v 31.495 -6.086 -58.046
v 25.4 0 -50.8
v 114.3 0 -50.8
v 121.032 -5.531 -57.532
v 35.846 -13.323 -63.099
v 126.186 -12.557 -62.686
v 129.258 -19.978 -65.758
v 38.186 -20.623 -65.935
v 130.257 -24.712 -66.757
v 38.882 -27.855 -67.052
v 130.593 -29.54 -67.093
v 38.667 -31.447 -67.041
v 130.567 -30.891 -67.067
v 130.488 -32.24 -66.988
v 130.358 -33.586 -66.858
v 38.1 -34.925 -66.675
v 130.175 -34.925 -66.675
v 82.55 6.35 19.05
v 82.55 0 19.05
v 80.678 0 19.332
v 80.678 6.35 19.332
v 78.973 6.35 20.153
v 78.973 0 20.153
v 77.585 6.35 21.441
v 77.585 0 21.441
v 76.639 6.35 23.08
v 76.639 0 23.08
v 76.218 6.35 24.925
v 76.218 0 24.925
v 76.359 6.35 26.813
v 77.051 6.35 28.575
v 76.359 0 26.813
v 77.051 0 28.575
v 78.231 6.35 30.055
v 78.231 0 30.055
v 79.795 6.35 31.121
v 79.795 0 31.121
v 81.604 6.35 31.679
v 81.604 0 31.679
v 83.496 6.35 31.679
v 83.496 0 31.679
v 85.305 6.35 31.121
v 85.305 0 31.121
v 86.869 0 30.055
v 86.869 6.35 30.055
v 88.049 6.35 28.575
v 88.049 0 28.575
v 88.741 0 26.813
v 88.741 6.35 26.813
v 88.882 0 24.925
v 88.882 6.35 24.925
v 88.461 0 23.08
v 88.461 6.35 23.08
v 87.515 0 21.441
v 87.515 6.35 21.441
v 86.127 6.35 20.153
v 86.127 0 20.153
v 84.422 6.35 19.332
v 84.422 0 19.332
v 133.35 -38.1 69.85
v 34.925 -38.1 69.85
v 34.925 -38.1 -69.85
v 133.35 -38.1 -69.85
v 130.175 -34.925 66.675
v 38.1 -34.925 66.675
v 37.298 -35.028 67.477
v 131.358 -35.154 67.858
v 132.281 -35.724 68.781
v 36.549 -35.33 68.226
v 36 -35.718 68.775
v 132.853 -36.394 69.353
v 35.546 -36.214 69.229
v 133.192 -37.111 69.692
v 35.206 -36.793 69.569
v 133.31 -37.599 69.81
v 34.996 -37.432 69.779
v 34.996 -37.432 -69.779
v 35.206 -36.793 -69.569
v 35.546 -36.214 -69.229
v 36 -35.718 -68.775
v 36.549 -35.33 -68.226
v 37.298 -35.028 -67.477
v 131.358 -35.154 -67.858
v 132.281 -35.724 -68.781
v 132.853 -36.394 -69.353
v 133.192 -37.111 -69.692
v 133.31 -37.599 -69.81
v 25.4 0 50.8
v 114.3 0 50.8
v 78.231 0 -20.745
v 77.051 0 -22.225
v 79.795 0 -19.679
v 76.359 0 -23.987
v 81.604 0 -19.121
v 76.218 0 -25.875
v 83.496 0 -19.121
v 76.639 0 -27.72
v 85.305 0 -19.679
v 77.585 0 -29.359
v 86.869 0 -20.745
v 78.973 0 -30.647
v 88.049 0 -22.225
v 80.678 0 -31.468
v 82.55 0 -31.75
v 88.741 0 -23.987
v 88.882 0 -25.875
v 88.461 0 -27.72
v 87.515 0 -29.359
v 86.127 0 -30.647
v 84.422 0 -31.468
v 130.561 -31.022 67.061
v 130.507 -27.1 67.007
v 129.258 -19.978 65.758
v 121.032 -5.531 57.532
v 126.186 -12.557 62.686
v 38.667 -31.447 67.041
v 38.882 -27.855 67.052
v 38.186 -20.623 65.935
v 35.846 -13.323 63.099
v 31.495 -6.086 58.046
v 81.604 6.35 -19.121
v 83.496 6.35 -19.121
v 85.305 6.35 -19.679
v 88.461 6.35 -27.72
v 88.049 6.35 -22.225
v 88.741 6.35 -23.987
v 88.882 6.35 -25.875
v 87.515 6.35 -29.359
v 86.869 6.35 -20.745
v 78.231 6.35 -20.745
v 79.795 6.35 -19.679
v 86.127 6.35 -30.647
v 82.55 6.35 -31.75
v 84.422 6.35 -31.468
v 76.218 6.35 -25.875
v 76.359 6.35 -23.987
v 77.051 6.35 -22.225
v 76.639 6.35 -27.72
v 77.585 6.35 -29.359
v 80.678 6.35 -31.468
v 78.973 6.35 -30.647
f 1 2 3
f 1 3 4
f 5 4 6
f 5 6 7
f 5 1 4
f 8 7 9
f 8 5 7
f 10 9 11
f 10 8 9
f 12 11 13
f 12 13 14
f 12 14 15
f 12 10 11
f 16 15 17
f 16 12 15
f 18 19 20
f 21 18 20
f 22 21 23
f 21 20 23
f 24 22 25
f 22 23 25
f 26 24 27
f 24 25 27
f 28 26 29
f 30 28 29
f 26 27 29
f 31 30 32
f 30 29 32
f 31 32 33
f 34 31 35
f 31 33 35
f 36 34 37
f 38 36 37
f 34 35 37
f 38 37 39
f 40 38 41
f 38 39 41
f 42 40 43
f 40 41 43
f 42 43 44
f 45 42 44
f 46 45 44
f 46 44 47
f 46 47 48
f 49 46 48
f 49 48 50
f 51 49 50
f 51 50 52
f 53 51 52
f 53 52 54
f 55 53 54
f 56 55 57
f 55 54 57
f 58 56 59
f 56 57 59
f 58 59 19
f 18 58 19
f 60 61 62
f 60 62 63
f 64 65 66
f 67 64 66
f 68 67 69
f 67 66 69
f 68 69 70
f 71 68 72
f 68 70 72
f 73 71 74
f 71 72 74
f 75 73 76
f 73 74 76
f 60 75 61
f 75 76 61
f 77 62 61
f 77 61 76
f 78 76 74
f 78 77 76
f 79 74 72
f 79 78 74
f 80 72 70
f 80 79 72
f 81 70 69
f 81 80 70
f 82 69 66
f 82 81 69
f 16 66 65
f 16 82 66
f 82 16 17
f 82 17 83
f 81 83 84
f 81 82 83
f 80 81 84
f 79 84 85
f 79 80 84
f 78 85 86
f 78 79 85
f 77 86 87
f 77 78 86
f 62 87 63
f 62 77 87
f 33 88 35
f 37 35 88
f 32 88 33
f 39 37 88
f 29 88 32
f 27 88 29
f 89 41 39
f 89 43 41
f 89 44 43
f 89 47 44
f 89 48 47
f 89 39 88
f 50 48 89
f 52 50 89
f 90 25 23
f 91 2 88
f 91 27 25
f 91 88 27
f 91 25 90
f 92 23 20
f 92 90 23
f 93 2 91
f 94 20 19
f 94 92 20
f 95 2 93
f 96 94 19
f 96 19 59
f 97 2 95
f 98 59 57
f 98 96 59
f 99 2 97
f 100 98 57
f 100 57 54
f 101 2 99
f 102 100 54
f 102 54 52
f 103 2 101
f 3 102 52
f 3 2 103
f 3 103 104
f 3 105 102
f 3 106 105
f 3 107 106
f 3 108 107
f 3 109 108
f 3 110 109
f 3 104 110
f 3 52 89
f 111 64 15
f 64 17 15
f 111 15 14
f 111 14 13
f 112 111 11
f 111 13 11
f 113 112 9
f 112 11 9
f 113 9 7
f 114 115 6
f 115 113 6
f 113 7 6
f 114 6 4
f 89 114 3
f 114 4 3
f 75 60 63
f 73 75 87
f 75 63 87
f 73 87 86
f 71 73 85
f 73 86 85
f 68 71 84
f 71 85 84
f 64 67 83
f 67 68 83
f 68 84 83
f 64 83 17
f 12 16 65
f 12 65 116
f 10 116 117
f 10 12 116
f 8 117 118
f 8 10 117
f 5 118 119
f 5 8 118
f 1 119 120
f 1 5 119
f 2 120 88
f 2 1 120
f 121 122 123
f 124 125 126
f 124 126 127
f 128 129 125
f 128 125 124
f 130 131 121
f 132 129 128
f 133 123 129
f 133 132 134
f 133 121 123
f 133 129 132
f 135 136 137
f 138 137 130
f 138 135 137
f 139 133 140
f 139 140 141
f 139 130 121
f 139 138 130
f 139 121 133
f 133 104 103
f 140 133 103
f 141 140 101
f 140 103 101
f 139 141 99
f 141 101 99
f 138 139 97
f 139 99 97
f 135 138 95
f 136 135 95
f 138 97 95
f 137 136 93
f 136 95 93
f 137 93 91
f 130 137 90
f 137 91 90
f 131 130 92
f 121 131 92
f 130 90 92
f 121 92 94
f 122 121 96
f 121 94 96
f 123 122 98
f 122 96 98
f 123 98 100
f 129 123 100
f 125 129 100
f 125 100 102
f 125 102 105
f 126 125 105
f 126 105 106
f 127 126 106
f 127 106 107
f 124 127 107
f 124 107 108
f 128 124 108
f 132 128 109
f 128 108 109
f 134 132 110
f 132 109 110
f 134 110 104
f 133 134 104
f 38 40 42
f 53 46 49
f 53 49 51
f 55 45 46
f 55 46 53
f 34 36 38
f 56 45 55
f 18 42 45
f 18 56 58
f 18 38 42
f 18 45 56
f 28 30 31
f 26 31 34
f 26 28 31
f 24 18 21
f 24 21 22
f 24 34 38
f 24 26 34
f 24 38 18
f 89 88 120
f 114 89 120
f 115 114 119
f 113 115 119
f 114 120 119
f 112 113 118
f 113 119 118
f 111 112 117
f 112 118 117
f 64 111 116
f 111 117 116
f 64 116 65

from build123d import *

# Parameters (mm, degrees)
SKETCH1_W               = 228.6
SKETCH1_H               = 101.6
BOSS_EXTRUDE1_DEPTH     = 38.1
SKETCH2_W               = 266.7
SKETCH2_H               = 139.7
BOSS_EXTRUDE2_DEPTH     = 38.1
CUT_EXTRUDE1_DEPTH      = 70.85
CUT_EXTRUDE1_DEPTH_BACK = 70.85
CUT_EXTRUDE2_DEPTH      = 134.35
CUT_EXTRUDE2_DEPTH_BACK = 134.35
BOSS_EXTRUDE3_DEPTH     = 117.475
CUT_EXTRUDE3_DEPTH      = 70.85
CUT_EXTRUDE3_DEPTH_BACK = 70.85
BOSS_EXTRUDE6_DEPTH     = 50.8
CUT_EXTRUDE4_DEPTH      = 134.35
CUT_EXTRUDE4_DEPTH_BACK = 134.35
BOSS_EXTRUDE7_DEPTH     = 11.43
SKETCH12_W              = 101.6
SKETCH12_H              = 44.45
CUT_EXTRUDE5_DEPTH      = 57.15
SKETCH13_W              = 25.4
SKETCH13_H              = 15.875
CUT_EXTRUDE6_DEPTH      = 8.89
SKETCH14_W              = 234.95
SKETCH14_H              = 73.385904338
CUT_EXTRUDE7_DEPTH      = 70.85
CUT_EXTRUDE7_DEPTH_BACK = 70.85
SKETCH15_R              = 6.35
BOSS_EXTRUDE8_DEPTH     = 6.35
SKETCH16_W              = 114.519931472
SKETCH16_H              = 54.078527613
CUT_EXTRUDE8_DEPTH      = 70.85
CUT_EXTRUDE8_DEPTH_BACK = 70.85


with BuildPart() as part:
    # Sketch1 → Boss-Extrude1 (new body)
    with BuildSketch(Plane(origin=(0, 0, 0), x_dir=(1, 0, 0), z_dir=(0, 1, 0))):
        Rectangle(SKETCH1_W, SKETCH1_H)
    extrude(amount=BOSS_EXTRUDE1_DEPTH)

    # Sketch2 → Boss-Extrude2 (add)
    with BuildSketch(Plane.XZ):
        Rectangle(SKETCH2_W, SKETCH2_H)
    extrude(amount=BOSS_EXTRUDE2_DEPTH)

    # Sketch4 → Cut-Extrude1 (cut, two sides)
    with BuildSketch(Plane.XY) as cut_extrude1_sk:
        with BuildLine():
            Line((25.4, 0), (-25.4, 0))
            ThreePointArc((-25.4, 0), (-36.780856653, -15.633097581), (-38.1, -34.925))
            ThreePointArc((-38.1, -34.925), (-35.85493597, -35.85493597), (-34.925, -38.1))
            Line((-34.925, -38.1), (34.925, -38.1))
            ThreePointArc((34.925, -38.1), (35.85493597, -35.85493597), (38.1, -34.925))
            ThreePointArc((38.1, -34.925), (36.780856653, -15.633097581), (25.4, 0))
        make_face()
        with BuildLine():
            Line((114.3, 0), (138.625991559, 8.381745969))
            Line((138.625991559, 8.381745969), (149.850712343, -24.19529276))
            Line((149.850712343, -24.19529276), (133.35, -38.1))
            ThreePointArc((133.35, -38.1), (132.42006403, -35.85493597), (130.175, -34.925))
            ThreePointArc((130.175, -34.925), (127.462245798, -15.087615547), (114.3, 0))
        make_face()
        with BuildLine():
            Line((-149.850712343, -24.19529276), (-133.35, -38.1))
            ThreePointArc((-133.35, -38.1), (-132.42006403, -35.85493597), (-130.175, -34.925))
            ThreePointArc((-130.175, -34.925), (-127.462245798, -15.087615547), (-114.3, 0))
            Line((-114.3, 0), (-138.625991559, 8.381745969))
            Line((-138.625991559, 8.381745969), (-149.850712343, -24.19529276))
        make_face()
    extrude(amount=CUT_EXTRUDE1_DEPTH, mode=Mode.SUBTRACT)
    extrude(cut_extrude1_sk.sketch, amount=-CUT_EXTRUDE1_DEPTH_BACK, mode=Mode.SUBTRACT)

    # Sketch5 → Cut-Extrude2 (cut, two sides)
    with BuildSketch(Plane(origin=(0, 0, 0), x_dir=(0, 0, -1), z_dir=(1, 0, 0))) as cut_extrude2_sk:
        with BuildLine():
            Line((-69.85, -38.1), (-80.267672211, -6.179959038))
            Line((-80.267672211, -6.179959038), (-69.85, 0.848763613))
            Line((-69.85, 0.848763613), (-50.8, 0))
            ThreePointArc((-50.8, 0), (-63.962245798, -15.087615547), (-66.675, -34.925))
            ThreePointArc((-66.675, -34.925), (-68.92006403, -35.85493597), (-69.85, -38.1))
        make_face()
        with BuildLine():
            Line((69.85, 0.848763613), (50.8, 0))
            ThreePointArc((50.8, 0), (63.962245798, -15.087615547), (66.675, -34.925))
            ThreePointArc((66.675, -34.925), (68.92006403, -35.85493597), (69.85, -38.1))
            Line((69.85, -38.1), (80.267672211, -6.179959038))
            Line((80.267672211, -6.179959038), (69.85, 0.848763613))
        make_face()
    extrude(amount=CUT_EXTRUDE2_DEPTH, mode=Mode.SUBTRACT)
    extrude(cut_extrude2_sk.sketch, amount=-CUT_EXTRUDE2_DEPTH_BACK, mode=Mode.SUBTRACT)

    # Sketch7 → Boss-Extrude3 (add, symmetric)
    with BuildSketch(Plane(origin=(0, 0, 0), x_dir=(0, 0, -1), z_dir=(1, 0, 0))):
        with BuildLine():
            Line((-50.8, 38.1), (50.8, 38.1))
            ThreePointArc((50.8, 38.1), (53.975, 34.925), (50.8, 31.75))
            ThreePointArc((50.8, 31.75), (52.363441445, 19.05), (50.8, 6.35))
            ThreePointArc((50.8, 6.35), (53.975, 3.175), (50.8, 0))
            Line((50.8, 0), (-50.8, 0))
            ThreePointArc((-50.8, 0), (-53.975, 3.175), (-50.8, 6.35))
            ThreePointArc((-50.8, 6.35), (-52.363441445, 19.05), (-50.8, 31.75))
            ThreePointArc((-50.8, 31.75), (-53.975, 34.925), (-50.8, 38.1))
        make_face()
    extrude(amount=BOSS_EXTRUDE3_DEPTH, both=True)

    # Sketch8 → Cut-Extrude3 (cut, two sides)
    with BuildSketch(Plane.XY) as cut_extrude3_sk:
        with BuildLine():
            Line((-114.3, 38.1), (-123.468271352, 41.287608438))
            Line((-123.468271352, 41.287608438), (-120.491237125, -2.317187004))
            Line((-120.491237125, -2.317187004), (-114.3, 0))
            ThreePointArc((-114.3, 0), (-117.475, 3.175), (-114.3, 6.35))
            ThreePointArc((-114.3, 6.35), (-116.592108499, 19.05), (-114.3, 31.75))
            ThreePointArc((-114.3, 31.75), (-117.475, 34.925), (-114.3, 38.1))
        make_face()
        with BuildLine():
            Line((120.491237125, -2.317187004), (114.3, 0))
            ThreePointArc((114.3, 0), (117.475, 3.175), (114.3, 6.35))
            ThreePointArc((114.3, 6.35), (116.592108499, 19.05), (114.3, 31.75))
            ThreePointArc((114.3, 31.75), (117.475, 34.925), (114.3, 38.1))
            Line((114.3, 38.1), (123.468271352, 41.287608438))
            Line((123.468271352, 41.287608438), (120.491237125, -2.317187004))
        make_face()
    extrude(amount=CUT_EXTRUDE3_DEPTH, mode=Mode.SUBTRACT)
    extrude(cut_extrude3_sk.sketch, amount=-CUT_EXTRUDE3_DEPTH_BACK, mode=Mode.SUBTRACT)

    # Sketch9 → Boss-Extrude6 (add, symmetric)
    with BuildSketch(Plane.XY):
        with BuildLine():
            Line((-114.3, 38.1), (114.3, 38.1))
            ThreePointArc((114.3, 38.1), (92.707665567, 45.121477655), (79.375, 63.5))
            ThreePointArc((79.375, 63.5), (0, 41.272917837), (-79.375, 63.5))
            ThreePointArc((-79.375, 63.5), (-92.707665567, 45.121477655), (-114.3, 38.1))
        make_face()
    extrude(amount=BOSS_EXTRUDE6_DEPTH, both=True)

    # Sketch10 → Cut-Extrude4 (cut, two sides)
    with BuildSketch(Plane(origin=(0, 0, 0), x_dir=(0, 0, -1), z_dir=(1, 0, 0))) as cut_extrude4_sk:
        with BuildLine():
            Line((25.4, 63.5), (50.8, 63.5))
            Line((50.8, 63.5), (50.8, 38.1))
            ThreePointArc((50.8, 38.1), (35.780017166, 48.480017166), (25.4, 63.5))
        make_face()
        with BuildLine():
            Line((-50.8, 63.5), (-50.8, 38.1))
            ThreePointArc((-50.8, 38.1), (-35.780017166, 48.480017166), (-25.4, 63.5))
            Line((-25.4, 63.5), (-50.8, 63.5))
        make_face()
    extrude(amount=CUT_EXTRUDE4_DEPTH, mode=Mode.SUBTRACT)
    extrude(cut_extrude4_sk.sketch, amount=-CUT_EXTRUDE4_DEPTH_BACK, mode=Mode.SUBTRACT)

    # Sketch11 → Boss-Extrude7 (add)
    with BuildSketch(Plane.XY.offset(9.525)):
        with BuildLine():
            Line((-79.375, 63.5), (-79.375, 68.58))
            ThreePointArc((-79.375, 68.58), (0, 45.590721784), (79.375, 68.58))
            Line((79.375, 68.58), (79.375, 63.5))
            ThreePointArc((79.375, 63.5), (0, 23.789706403), (-79.375, 63.5))
        make_face()
    extrude(amount=BOSS_EXTRUDE7_DEPTH)

    # Sketch12 → Cut-Extrude5 (cut)
    with BuildSketch(Plane(origin=(0, 63.5, 0), x_dir=(-1, 0, 0), z_dir=(0, -1, 0))):
        Rectangle(SKETCH12_W, SKETCH12_H)
    extrude(amount=CUT_EXTRUDE5_DEPTH, mode=Mode.SUBTRACT)

    # Sketch13 → Cut-Extrude6 (cut)
    with BuildSketch(Plane.XY.offset(-22.225)):
        with Locations((-6.35, 26.9875)):
            Rectangle(SKETCH13_W, SKETCH13_H)
    extrude(amount=-CUT_EXTRUDE6_DEPTH, mode=Mode.SUBTRACT)

    # Sketch14 → Cut-Extrude7 (cut, two sides)
    with BuildSketch(Plane.XY) as cut_extrude7_sk:
        with Locations((0, 36.692952169)):
            Rectangle(SKETCH14_W, SKETCH14_H)
    extrude(amount=CUT_EXTRUDE7_DEPTH, mode=Mode.SUBTRACT)
    extrude(cut_extrude7_sk.sketch, amount=-CUT_EXTRUDE7_DEPTH_BACK, mode=Mode.SUBTRACT)

    # Sketch15 → Boss-Extrude8 (add)
    with BuildSketch(Plane(origin=(0, 0, 0), x_dir=(1, 0, 0), z_dir=(0, 1, 0))):
        with Locations(Location((-82.55, 25.4, 0), (0, 0, 90))):  # turned: the seam where the file's is
            Circle(SKETCH15_R)
        with Locations(Location((-82.55, -25.4, 0), (0, 0, 90))):  # turned: the seam where the file's is
            Circle(SKETCH15_R)
        with Locations(Location((82.55, -25.4, 0), (0, 0, 90))):  # turned: the seam where the file's is
            Circle(SKETCH15_R)
        with Locations(Location((82.55, 25.4, 0), (0, 0, 90))):  # turned: the seam where the file's is
            Circle(SKETCH15_R)
    extrude(amount=BOSS_EXTRUDE8_DEPTH)

    # Sketch16 → Cut-Extrude8 (cut, two sides)
    with BuildSketch(Plane.XY) as cut_extrude8_sk:
        with Locations((-80.803403424, -19.002671916)):
            Rectangle(SKETCH16_W, SKETCH16_H)
    extrude(amount=CUT_EXTRUDE8_DEPTH, mode=Mode.SUBTRACT)
    extrude(cut_extrude8_sk.sketch, amount=-CUT_EXTRUDE8_DEPTH_BACK, mode=Mode.SUBTRACT)


solid = part.part
